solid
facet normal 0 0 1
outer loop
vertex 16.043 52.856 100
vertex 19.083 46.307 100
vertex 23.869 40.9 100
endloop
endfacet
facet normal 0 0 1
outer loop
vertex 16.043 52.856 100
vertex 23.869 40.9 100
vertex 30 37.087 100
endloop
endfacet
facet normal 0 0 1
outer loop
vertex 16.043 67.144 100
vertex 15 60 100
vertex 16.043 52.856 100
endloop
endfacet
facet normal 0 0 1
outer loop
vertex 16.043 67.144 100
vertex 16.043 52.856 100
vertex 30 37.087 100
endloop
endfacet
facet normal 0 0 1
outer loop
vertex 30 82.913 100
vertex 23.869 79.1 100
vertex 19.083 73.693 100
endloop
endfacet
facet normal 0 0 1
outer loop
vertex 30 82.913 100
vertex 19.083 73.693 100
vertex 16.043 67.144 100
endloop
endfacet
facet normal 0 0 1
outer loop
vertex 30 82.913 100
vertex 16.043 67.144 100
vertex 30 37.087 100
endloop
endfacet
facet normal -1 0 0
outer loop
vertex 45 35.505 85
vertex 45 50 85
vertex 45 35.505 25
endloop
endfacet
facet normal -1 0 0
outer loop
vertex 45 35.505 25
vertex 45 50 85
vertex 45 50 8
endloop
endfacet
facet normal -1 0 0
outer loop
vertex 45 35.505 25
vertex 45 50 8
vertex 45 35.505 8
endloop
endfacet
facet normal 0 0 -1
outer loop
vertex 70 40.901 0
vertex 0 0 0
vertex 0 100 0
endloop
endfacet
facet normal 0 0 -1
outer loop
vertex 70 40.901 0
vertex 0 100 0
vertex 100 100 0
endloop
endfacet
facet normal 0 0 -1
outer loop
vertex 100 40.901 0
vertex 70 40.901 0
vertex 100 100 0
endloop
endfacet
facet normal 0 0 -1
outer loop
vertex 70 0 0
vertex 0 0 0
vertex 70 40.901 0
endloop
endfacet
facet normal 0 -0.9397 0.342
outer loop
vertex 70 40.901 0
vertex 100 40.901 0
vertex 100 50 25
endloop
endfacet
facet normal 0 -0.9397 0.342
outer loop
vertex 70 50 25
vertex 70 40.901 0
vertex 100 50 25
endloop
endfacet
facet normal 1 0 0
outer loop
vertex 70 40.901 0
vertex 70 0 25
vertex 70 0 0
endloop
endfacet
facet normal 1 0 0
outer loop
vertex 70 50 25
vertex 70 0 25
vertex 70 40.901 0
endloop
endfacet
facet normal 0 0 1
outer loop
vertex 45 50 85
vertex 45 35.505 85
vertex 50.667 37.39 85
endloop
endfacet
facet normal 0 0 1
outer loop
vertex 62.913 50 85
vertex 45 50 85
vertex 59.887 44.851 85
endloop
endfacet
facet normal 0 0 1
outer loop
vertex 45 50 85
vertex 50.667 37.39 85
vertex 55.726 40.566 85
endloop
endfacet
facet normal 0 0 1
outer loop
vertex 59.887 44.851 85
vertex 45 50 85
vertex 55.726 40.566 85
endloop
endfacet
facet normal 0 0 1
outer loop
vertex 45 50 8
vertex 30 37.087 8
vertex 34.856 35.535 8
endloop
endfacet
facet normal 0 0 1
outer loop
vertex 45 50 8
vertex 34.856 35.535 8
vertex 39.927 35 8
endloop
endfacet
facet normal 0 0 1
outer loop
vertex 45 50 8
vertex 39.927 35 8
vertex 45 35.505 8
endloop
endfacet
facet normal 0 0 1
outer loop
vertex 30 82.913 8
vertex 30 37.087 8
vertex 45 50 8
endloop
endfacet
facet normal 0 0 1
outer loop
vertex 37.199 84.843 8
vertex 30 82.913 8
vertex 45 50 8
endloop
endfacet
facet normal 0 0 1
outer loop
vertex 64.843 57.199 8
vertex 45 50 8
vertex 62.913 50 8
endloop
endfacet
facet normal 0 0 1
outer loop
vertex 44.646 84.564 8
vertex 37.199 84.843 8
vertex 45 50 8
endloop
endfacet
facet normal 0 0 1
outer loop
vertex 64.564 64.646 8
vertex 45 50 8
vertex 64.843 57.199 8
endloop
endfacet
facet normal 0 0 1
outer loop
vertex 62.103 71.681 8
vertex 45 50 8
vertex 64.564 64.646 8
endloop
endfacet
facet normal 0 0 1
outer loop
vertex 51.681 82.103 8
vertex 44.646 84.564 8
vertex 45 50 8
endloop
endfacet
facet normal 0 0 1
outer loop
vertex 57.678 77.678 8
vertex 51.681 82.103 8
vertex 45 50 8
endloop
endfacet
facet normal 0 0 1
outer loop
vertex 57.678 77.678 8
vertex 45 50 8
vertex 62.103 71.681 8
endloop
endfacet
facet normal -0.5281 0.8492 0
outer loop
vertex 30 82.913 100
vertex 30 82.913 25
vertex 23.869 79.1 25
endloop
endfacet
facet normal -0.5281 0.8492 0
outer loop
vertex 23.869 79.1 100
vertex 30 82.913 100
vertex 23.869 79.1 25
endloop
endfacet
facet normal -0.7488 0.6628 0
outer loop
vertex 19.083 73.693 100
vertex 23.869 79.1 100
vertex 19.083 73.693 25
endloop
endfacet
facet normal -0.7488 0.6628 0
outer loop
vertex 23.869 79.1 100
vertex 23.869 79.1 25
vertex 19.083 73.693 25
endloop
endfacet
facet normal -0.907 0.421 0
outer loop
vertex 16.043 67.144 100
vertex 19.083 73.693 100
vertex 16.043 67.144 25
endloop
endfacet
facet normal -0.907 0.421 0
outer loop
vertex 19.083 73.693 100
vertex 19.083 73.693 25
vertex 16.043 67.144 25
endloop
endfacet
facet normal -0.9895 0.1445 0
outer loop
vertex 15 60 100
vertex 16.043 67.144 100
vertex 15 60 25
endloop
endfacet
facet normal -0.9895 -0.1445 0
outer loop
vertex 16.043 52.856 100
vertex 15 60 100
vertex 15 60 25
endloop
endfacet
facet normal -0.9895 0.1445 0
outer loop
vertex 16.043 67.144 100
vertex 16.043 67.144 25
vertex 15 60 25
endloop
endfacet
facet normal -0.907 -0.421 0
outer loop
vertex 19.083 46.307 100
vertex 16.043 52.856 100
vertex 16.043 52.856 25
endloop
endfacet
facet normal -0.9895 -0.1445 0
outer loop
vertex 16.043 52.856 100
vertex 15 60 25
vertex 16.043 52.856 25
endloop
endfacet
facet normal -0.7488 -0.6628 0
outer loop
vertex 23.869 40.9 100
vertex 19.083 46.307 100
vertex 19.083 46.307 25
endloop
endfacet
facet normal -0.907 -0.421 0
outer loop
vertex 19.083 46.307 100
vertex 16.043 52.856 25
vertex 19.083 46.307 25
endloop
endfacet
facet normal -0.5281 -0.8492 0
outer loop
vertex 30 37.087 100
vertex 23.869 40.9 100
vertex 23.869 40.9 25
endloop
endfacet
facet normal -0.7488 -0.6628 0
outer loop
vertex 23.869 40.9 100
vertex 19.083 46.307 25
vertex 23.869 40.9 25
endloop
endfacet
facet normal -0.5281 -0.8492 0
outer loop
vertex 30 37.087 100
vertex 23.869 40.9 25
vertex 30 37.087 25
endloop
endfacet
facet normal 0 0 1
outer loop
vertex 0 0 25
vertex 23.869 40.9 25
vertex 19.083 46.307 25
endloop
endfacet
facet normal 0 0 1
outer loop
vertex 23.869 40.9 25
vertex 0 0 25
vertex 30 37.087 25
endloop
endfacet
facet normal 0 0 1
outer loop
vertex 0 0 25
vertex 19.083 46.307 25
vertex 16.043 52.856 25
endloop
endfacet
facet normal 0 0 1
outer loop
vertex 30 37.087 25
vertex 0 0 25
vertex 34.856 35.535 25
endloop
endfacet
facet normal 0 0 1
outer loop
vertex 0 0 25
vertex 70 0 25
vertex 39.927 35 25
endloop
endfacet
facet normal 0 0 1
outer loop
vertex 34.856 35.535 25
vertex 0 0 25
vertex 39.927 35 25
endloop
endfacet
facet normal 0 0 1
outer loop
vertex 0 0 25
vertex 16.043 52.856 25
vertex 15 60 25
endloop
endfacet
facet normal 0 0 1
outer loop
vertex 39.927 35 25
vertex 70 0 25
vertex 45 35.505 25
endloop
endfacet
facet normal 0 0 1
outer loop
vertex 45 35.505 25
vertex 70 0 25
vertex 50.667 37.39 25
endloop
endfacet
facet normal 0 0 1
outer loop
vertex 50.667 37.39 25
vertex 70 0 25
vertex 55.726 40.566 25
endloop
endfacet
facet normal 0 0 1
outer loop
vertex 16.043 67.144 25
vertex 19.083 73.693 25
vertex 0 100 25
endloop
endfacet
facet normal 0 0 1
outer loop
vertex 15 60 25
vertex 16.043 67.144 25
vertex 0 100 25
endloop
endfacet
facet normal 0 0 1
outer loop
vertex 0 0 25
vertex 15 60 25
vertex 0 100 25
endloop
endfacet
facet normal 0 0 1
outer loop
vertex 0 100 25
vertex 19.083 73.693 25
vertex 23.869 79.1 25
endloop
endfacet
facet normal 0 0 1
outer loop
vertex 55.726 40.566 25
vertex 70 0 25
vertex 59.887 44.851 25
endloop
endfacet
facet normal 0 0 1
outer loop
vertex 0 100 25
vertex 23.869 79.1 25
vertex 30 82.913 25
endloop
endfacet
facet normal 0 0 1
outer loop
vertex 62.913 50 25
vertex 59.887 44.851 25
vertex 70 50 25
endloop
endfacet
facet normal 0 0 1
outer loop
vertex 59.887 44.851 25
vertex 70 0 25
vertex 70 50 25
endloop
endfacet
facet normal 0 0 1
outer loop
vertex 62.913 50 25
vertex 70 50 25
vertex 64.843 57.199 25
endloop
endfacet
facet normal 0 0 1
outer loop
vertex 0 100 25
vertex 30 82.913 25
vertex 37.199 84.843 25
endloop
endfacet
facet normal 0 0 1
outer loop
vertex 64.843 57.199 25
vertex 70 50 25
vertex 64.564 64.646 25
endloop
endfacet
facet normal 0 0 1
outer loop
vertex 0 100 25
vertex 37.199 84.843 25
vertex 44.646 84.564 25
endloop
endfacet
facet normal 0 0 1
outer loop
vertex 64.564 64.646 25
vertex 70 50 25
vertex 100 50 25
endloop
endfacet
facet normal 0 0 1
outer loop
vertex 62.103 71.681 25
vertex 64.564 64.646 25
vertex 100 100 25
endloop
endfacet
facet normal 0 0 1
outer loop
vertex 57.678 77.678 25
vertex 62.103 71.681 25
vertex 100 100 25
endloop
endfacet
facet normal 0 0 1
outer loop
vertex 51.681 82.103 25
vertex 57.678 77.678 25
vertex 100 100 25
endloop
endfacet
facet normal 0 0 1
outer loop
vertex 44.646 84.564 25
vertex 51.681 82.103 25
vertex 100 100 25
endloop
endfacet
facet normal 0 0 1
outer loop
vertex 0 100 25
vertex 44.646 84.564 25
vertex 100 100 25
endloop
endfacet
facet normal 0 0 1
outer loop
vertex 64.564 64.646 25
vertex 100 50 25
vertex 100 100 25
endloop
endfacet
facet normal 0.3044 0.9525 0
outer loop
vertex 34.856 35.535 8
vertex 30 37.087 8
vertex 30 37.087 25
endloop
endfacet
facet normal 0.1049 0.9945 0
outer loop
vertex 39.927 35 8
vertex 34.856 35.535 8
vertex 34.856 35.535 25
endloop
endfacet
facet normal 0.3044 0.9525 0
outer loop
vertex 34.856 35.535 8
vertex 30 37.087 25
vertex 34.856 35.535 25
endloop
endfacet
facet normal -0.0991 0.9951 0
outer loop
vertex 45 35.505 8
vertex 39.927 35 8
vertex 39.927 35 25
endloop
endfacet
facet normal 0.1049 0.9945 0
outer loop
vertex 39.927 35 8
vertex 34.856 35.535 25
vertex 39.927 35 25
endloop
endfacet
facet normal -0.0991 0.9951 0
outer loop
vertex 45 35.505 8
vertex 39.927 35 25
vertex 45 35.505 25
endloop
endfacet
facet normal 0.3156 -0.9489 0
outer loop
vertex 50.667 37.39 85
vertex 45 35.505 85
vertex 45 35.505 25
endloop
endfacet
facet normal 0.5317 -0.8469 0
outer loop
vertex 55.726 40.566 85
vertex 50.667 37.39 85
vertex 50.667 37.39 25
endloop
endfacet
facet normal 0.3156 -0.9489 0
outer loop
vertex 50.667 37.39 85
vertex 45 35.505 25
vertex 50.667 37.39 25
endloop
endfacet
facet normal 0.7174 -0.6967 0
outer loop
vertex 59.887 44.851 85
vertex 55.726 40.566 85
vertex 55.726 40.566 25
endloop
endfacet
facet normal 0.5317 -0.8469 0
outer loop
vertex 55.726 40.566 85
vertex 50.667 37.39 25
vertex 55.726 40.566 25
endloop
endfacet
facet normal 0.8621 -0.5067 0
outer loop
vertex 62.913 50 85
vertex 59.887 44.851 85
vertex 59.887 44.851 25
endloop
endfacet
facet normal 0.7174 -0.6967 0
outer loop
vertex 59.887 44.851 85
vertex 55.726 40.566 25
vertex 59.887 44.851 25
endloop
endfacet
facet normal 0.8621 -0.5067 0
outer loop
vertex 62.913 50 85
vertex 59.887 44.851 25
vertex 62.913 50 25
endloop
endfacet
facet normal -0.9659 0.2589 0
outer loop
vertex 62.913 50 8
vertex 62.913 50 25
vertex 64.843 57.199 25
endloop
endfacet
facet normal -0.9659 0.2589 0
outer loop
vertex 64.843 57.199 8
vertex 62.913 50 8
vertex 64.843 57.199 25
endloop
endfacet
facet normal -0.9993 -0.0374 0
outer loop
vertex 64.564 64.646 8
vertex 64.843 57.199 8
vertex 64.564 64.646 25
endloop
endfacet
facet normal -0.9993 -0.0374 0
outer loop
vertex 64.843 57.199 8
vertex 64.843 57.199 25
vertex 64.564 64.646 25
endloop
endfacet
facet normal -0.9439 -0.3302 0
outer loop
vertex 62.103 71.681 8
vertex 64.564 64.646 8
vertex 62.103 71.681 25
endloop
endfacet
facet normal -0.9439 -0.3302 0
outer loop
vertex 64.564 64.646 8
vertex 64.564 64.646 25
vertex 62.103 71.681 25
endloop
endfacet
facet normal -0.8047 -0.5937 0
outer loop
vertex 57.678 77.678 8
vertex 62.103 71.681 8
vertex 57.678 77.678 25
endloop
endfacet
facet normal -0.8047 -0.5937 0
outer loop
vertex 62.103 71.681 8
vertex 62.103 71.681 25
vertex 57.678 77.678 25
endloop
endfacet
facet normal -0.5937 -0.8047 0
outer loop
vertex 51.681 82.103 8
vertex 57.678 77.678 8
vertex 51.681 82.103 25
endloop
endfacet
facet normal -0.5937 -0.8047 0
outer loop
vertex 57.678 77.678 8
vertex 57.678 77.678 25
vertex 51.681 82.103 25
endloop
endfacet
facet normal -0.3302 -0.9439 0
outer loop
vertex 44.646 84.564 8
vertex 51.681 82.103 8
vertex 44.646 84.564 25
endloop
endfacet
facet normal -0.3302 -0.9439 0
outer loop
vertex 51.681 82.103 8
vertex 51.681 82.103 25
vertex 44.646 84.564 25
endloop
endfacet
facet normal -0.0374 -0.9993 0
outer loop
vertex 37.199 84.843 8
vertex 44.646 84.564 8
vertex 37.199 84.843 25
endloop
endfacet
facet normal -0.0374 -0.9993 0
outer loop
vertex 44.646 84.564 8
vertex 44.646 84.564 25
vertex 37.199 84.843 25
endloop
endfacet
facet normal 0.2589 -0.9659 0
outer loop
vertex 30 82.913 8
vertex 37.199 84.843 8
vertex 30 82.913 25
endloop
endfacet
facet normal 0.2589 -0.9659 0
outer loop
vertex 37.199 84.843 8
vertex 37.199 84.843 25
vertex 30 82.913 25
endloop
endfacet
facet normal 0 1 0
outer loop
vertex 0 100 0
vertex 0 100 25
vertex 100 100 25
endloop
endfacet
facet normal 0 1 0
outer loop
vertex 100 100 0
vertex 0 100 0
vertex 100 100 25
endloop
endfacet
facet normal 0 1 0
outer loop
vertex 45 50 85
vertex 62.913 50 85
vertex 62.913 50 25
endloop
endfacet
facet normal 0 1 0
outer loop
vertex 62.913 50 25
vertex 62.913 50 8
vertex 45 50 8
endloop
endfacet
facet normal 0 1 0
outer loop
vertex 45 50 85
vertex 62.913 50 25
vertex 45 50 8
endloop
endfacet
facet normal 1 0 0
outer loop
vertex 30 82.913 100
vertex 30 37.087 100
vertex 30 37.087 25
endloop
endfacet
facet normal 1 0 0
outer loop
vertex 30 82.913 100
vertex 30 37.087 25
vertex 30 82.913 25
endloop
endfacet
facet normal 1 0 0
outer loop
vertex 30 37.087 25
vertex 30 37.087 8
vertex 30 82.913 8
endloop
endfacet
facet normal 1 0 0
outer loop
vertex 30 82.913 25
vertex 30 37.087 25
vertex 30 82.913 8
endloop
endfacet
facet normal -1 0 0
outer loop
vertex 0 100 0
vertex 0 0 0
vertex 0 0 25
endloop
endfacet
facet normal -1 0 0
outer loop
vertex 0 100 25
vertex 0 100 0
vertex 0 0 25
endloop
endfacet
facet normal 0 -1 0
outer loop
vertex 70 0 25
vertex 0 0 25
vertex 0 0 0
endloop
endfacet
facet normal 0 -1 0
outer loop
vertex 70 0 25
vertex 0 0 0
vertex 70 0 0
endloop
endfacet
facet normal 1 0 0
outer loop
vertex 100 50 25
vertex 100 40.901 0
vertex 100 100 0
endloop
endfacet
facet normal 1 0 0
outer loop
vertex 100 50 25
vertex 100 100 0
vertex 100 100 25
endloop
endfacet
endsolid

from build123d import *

# Parameters (mm, degrees)
F0_W      = 100
F0_H      = 100
F1_DEPTH  = 100
F2_W      = 100
F2_H      = 75
F3_DEPTH  = 100.001
F4_R      = 25
F5_DEPTH  = 17
F7_DEPTH  = 92
F8_W      = 30.7691868506
F8_H      = 32.9230235268
F9_DEPTH  = 100.001
F11_DEPTH = 30


with BuildPart() as f1:
    # F0 (on Front) → F1 (new body)
    with BuildSketch(Plane.XZ):
        with Locations((50, 50)):
            Rectangle(F0_W, F0_H)
    extrude(amount=-F1_DEPTH)

    # F2 (on face) → F3 (cut, through all)
    with BuildSketch(Plane.YZ.offset(100)):
        with Locations((50, 62.5)):
            Rectangle(F2_W, F2_H)
    extrude(amount=-F3_DEPTH, mode=Mode.SUBTRACT)

    # F4 (on face) → F5 (cut)
    with BuildSketch(Plane.XY.offset(25)):
        with Locations((40, 60)):
            Circle(F4_R)
    extrude(amount=-F5_DEPTH, mode=Mode.SUBTRACT)

    # F6 (on face) → F7 (join)
    with BuildSketch(Plane.XY.offset(8)):
        with BuildLine():
            Line((30, 37.0871215252), (30, 82.9128784748))
            ThreePointArc((30, 82.9128784748), (15, 60), (30, 37.0871215252))
        make_face()
        with BuildLine():
            Line((62.9128784748, 50), (45, 50))
            Line((45, 50), (45, 35.5051025722))
            ThreePointArc((45, 35.5051025722), (55.7260201274, 40.5656929387), (62.9128784748, 50))
        make_face()
    extrude(amount=F7_DEPTH)

    # F8 (on face) → F9 (cut, through all)
    with BuildSketch(Plane.XZ):
        with Locations((54.3266609311, 101.4615117634)):
            Rectangle(F8_W, F8_H)
    extrude(amount=-F9_DEPTH, mode=Mode.SUBTRACT)

    # F10 (on face) → F11 (cut)
    with BuildSketch(Plane.YZ.offset(100)):
        Polygon((40.9007441433, 0), (50, 25), (0, 25), (0, 0), align=None)
    extrude(amount=-F11_DEPTH, mode=Mode.SUBTRACT)


solid = f1.part
